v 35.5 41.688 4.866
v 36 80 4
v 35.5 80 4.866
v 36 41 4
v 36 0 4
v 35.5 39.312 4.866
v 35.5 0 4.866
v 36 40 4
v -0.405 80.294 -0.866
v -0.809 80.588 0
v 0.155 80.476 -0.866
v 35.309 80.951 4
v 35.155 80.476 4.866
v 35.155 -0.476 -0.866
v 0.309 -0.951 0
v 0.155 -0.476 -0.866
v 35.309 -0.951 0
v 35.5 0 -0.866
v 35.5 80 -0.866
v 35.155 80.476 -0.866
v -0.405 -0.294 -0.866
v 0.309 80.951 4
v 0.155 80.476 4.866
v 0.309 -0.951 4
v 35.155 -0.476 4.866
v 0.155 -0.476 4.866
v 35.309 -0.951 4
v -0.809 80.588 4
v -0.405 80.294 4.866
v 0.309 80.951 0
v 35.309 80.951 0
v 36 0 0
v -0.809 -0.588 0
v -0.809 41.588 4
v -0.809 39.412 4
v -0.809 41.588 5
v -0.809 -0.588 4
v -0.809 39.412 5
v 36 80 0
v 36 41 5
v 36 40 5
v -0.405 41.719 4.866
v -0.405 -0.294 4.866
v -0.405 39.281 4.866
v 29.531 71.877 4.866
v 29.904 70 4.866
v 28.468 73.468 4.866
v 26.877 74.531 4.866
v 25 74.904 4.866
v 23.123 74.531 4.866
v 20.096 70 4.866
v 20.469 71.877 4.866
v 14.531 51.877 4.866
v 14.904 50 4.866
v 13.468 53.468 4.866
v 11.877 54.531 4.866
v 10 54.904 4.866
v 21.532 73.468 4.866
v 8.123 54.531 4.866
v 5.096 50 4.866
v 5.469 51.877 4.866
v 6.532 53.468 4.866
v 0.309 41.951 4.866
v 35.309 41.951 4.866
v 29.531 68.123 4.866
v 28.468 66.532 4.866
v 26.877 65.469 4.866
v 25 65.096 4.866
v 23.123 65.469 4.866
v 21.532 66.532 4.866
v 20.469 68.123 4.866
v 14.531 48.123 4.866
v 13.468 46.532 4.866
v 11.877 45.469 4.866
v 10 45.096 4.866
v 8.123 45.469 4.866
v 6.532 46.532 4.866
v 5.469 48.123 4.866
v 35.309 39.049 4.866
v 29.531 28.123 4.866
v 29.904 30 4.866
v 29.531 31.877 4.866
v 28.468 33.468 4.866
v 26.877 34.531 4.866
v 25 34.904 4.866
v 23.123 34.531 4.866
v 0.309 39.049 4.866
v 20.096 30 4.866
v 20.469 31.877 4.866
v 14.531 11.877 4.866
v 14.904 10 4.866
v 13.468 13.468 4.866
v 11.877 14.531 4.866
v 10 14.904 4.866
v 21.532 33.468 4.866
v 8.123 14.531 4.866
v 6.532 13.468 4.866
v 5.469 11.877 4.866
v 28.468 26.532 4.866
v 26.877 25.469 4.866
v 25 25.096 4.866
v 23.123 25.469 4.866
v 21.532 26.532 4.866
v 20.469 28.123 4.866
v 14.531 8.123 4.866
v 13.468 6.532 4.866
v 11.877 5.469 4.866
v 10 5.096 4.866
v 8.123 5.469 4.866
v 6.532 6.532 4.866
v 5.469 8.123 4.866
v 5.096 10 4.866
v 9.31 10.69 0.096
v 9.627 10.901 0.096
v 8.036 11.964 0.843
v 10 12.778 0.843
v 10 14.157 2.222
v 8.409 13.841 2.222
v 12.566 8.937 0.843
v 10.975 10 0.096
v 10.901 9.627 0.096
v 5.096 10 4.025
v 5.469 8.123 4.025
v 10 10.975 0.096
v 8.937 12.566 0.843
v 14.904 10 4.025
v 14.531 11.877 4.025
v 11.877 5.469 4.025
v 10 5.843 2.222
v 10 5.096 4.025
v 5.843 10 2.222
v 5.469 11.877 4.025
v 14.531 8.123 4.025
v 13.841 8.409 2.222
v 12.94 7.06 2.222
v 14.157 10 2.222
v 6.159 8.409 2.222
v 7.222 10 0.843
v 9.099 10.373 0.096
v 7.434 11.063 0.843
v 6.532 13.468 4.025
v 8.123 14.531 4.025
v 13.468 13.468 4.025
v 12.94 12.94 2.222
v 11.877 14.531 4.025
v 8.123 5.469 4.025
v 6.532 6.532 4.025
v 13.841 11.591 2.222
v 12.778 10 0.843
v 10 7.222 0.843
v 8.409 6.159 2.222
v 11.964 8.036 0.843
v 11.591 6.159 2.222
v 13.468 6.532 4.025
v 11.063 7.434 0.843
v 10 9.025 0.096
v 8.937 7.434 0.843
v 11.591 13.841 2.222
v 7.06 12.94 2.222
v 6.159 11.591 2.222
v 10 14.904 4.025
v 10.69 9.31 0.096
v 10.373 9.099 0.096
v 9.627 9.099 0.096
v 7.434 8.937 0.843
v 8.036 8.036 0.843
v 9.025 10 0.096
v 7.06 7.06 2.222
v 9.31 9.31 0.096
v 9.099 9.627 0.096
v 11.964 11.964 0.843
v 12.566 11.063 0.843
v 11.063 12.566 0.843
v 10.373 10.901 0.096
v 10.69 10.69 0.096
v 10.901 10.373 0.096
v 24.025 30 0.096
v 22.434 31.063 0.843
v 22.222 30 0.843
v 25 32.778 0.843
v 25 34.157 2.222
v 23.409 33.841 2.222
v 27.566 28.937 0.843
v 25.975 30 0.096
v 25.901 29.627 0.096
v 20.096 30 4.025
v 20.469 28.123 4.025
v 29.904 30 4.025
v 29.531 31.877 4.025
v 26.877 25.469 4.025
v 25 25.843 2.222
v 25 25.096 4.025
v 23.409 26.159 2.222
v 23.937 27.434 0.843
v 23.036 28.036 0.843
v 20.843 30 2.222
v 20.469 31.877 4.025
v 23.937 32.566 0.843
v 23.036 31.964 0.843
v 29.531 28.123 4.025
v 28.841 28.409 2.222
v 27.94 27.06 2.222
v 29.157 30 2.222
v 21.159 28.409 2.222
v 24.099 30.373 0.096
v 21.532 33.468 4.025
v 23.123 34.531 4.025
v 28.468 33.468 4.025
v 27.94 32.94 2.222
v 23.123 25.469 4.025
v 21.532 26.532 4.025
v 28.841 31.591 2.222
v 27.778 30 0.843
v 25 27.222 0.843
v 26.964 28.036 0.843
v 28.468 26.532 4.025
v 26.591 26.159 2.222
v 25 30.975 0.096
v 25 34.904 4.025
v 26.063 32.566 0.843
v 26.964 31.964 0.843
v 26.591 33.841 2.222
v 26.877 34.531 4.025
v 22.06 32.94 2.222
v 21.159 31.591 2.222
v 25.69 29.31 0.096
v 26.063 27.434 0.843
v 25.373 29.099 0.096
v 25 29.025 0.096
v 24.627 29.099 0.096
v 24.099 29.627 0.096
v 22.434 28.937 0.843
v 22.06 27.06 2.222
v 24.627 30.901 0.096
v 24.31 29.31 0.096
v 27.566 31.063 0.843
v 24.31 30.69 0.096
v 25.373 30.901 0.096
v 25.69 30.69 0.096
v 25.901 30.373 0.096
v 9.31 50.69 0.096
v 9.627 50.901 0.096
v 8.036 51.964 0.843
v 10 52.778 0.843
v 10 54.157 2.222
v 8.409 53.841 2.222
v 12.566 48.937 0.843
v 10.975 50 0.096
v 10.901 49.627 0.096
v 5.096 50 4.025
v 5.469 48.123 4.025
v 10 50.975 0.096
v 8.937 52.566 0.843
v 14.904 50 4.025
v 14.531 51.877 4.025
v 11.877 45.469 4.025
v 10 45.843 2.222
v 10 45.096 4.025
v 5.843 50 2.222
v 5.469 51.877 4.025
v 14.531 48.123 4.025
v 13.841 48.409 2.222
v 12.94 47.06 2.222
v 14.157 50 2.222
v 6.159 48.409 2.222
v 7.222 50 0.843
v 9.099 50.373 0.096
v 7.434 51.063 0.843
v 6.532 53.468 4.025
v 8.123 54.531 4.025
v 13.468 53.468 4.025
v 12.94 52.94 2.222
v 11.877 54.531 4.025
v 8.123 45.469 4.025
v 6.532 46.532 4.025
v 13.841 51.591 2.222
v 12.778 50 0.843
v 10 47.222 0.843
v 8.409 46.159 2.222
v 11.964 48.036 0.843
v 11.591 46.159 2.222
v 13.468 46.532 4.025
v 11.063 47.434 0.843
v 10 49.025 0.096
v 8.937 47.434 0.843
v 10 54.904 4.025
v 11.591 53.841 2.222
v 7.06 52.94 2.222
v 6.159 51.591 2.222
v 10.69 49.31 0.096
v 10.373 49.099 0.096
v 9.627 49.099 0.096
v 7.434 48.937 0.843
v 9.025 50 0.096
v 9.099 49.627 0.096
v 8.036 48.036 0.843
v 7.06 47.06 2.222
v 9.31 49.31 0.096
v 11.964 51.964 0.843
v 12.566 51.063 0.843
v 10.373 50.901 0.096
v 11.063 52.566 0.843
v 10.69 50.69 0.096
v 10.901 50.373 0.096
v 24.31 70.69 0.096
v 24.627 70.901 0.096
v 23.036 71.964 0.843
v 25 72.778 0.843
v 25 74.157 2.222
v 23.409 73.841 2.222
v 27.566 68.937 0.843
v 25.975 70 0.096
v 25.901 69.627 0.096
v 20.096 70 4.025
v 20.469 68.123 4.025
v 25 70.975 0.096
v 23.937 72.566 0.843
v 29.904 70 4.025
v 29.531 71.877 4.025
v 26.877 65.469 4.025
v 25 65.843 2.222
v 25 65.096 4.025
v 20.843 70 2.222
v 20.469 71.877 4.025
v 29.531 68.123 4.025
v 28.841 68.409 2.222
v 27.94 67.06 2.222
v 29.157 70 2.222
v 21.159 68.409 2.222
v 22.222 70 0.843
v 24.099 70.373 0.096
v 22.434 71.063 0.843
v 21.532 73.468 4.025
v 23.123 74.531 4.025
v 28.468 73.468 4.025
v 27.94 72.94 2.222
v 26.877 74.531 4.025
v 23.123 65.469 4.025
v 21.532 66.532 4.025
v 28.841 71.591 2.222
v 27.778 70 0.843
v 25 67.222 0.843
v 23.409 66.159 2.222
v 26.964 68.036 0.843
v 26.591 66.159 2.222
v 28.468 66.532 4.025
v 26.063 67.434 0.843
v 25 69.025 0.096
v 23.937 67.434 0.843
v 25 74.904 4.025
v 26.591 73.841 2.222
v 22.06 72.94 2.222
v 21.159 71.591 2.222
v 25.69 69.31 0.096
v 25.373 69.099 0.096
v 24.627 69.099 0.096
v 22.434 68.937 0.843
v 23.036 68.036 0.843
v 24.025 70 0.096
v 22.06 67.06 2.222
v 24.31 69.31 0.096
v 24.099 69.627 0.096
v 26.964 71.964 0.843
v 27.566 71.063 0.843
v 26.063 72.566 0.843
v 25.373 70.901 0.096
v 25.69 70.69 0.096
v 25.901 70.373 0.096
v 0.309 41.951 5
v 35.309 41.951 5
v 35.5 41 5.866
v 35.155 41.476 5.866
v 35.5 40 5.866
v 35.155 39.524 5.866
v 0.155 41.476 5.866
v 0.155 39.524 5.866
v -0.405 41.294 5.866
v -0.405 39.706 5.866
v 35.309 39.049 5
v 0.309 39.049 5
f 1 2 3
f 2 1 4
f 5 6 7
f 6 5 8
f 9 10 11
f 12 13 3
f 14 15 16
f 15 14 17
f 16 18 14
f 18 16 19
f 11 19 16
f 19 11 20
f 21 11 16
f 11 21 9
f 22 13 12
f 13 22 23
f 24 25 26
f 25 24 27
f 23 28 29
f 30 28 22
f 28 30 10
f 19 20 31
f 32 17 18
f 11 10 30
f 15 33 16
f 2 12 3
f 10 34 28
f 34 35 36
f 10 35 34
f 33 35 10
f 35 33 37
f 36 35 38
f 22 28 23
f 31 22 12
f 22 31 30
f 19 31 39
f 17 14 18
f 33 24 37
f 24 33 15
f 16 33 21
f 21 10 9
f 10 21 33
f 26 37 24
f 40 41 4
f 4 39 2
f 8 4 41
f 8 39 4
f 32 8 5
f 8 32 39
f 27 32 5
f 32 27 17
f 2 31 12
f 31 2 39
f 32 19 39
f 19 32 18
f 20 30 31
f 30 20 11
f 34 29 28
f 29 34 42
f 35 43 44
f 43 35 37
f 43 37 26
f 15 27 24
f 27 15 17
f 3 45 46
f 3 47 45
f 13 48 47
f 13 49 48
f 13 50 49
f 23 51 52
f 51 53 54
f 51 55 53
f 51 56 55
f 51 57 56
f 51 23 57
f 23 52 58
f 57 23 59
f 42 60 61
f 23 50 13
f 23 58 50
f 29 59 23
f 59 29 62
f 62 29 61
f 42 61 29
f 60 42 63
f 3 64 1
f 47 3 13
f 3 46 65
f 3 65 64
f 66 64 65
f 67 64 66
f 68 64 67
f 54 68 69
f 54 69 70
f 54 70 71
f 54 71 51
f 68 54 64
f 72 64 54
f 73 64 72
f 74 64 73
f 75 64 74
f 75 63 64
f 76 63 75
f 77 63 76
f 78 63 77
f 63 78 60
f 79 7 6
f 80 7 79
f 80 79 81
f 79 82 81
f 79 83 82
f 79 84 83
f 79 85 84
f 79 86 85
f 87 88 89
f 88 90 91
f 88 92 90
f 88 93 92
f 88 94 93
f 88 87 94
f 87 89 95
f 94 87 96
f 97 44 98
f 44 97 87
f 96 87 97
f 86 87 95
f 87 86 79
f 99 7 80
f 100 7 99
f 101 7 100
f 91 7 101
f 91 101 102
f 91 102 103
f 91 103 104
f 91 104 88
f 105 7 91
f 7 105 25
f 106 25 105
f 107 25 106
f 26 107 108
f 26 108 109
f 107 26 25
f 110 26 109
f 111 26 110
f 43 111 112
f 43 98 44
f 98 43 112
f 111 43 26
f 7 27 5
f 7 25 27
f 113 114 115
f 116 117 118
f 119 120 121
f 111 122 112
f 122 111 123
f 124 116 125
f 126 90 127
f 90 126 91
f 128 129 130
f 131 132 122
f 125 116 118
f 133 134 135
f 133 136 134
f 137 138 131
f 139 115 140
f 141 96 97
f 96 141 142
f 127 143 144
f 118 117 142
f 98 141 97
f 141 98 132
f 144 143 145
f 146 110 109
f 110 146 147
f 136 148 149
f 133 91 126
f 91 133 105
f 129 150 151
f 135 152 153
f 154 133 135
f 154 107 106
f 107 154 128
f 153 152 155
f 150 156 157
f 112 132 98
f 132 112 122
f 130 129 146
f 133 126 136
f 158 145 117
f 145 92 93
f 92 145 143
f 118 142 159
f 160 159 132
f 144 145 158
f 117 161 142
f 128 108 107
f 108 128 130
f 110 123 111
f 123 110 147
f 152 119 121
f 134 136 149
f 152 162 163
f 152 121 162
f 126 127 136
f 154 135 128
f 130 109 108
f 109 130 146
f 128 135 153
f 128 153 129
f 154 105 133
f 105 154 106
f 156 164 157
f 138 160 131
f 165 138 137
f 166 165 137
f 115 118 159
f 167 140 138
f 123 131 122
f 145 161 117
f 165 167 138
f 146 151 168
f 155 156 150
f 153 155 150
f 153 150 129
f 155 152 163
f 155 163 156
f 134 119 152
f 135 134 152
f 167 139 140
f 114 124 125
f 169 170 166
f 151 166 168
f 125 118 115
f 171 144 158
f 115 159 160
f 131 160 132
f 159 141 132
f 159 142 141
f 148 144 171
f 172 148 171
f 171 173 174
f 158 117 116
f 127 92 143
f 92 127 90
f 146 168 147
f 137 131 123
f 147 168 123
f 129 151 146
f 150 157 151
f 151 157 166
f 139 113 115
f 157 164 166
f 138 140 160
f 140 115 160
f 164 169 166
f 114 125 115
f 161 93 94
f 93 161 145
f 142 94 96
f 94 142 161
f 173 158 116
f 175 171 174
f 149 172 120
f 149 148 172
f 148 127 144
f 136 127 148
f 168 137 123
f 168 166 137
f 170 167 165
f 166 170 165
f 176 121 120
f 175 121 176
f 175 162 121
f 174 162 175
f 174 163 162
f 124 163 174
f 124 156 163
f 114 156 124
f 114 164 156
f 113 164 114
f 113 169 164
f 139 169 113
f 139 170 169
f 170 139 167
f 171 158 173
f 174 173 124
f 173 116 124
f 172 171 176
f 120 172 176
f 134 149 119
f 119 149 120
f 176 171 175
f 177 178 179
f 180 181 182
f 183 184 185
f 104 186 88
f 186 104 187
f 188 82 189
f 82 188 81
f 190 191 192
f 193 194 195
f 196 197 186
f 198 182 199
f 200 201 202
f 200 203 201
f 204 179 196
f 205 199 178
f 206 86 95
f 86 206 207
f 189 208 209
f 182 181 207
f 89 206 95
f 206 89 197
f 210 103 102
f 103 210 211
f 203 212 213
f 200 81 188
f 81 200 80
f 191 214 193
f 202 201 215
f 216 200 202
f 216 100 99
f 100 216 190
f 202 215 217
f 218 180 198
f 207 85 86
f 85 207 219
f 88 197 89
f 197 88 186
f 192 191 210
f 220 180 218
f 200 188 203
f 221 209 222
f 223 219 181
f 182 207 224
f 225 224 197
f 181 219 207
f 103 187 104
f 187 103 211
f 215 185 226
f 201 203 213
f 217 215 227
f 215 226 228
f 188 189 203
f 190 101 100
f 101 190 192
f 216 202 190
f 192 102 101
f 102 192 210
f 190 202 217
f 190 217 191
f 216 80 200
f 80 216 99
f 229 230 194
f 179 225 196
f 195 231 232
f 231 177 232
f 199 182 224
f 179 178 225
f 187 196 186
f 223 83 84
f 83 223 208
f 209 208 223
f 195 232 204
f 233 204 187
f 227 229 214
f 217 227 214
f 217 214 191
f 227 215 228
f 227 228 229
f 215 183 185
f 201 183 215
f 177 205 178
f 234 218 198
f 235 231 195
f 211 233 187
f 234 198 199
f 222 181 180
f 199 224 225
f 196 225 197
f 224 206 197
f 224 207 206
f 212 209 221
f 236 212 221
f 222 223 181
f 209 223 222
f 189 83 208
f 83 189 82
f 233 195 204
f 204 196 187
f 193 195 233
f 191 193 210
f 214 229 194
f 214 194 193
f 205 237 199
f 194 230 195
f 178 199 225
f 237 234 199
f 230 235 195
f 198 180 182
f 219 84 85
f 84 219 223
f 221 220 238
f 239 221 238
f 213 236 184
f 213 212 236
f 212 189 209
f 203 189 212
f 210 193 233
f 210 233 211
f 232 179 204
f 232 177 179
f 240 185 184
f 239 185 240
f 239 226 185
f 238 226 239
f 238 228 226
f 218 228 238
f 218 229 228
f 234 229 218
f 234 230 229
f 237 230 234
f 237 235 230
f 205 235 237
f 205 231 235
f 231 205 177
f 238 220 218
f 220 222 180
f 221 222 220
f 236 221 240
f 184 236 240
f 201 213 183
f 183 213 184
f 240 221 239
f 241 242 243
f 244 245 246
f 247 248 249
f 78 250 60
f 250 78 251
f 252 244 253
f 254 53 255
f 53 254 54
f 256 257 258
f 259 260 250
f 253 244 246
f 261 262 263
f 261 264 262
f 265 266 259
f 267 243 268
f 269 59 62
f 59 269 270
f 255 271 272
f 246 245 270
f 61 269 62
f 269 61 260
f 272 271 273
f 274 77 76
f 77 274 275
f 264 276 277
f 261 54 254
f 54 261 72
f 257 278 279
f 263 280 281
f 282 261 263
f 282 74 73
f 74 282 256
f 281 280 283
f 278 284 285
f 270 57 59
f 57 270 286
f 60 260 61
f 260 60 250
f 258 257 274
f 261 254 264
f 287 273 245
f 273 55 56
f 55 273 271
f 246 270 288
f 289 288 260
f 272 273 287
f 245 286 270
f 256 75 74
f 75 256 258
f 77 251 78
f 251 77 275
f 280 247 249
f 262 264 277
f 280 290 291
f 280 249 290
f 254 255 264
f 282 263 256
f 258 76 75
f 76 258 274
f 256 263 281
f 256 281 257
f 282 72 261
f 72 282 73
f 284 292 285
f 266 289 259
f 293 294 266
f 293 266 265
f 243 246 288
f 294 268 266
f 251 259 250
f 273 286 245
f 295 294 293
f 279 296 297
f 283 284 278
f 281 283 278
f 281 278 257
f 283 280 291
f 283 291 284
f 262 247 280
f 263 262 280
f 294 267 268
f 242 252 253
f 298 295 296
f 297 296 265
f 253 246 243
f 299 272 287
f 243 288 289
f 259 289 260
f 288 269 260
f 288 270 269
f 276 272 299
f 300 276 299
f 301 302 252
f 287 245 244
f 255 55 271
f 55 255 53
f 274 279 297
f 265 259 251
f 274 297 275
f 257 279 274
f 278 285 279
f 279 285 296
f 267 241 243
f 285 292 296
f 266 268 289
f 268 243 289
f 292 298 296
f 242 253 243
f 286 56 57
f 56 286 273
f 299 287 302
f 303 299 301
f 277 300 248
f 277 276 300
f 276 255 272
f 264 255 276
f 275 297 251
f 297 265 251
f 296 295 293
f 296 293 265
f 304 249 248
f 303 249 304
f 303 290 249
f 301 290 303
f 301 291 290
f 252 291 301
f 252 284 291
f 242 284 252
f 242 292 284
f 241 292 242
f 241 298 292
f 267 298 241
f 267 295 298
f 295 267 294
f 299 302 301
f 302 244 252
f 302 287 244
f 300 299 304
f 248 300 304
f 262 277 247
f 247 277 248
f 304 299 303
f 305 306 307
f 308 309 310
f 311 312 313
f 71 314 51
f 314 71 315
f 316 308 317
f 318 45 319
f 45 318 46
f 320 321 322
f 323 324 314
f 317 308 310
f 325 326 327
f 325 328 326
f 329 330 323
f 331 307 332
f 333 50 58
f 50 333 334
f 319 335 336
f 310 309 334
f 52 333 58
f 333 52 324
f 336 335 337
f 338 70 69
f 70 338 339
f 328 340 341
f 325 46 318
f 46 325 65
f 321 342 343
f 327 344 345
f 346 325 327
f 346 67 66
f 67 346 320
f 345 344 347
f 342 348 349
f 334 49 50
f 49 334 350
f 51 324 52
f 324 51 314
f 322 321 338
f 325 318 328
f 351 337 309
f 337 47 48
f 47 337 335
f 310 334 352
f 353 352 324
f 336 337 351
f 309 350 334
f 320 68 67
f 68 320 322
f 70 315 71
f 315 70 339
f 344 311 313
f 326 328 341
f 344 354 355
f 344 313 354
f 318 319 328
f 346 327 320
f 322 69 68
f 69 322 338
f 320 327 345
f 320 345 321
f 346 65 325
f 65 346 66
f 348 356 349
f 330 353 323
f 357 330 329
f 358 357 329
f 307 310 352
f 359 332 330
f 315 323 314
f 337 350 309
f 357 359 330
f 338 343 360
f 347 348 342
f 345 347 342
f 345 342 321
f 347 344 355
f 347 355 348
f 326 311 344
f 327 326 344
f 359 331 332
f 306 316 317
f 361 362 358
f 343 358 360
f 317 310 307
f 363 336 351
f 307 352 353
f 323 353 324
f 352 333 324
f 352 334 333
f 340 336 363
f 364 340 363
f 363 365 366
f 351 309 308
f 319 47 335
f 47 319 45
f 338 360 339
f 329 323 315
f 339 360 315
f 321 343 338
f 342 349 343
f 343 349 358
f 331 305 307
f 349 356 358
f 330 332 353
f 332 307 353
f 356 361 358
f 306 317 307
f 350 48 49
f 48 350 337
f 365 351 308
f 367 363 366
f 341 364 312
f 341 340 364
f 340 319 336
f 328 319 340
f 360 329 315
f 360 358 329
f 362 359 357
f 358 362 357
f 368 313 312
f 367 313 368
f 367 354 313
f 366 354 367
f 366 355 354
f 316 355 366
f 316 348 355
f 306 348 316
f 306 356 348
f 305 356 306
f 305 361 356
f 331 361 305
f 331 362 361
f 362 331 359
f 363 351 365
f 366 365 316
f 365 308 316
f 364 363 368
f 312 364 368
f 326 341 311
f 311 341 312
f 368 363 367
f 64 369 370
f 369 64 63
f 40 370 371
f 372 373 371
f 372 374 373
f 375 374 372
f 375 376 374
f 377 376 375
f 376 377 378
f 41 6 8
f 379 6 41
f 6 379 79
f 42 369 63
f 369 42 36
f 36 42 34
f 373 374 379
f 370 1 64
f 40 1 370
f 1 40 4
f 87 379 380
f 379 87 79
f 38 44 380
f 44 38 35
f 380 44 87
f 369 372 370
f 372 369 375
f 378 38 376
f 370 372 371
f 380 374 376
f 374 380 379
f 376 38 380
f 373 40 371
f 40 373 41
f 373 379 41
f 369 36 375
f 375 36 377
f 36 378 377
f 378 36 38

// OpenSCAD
// Loguncov Maxim 13.12.13


//$fn=128;


translate([0,40,0])
minkowski()
{cube([35,1,5]);
sphere(1);
}

difference() {

//основа
minkowski()
{cube([35,80,4]);
sphere(1);
}

//отверстия
translate([10,10,5])sphere(5);
translate([25,30,5])sphere(5);

translate([10,50,5])sphere(5);
translate([25,70,5])sphere(5);


}
